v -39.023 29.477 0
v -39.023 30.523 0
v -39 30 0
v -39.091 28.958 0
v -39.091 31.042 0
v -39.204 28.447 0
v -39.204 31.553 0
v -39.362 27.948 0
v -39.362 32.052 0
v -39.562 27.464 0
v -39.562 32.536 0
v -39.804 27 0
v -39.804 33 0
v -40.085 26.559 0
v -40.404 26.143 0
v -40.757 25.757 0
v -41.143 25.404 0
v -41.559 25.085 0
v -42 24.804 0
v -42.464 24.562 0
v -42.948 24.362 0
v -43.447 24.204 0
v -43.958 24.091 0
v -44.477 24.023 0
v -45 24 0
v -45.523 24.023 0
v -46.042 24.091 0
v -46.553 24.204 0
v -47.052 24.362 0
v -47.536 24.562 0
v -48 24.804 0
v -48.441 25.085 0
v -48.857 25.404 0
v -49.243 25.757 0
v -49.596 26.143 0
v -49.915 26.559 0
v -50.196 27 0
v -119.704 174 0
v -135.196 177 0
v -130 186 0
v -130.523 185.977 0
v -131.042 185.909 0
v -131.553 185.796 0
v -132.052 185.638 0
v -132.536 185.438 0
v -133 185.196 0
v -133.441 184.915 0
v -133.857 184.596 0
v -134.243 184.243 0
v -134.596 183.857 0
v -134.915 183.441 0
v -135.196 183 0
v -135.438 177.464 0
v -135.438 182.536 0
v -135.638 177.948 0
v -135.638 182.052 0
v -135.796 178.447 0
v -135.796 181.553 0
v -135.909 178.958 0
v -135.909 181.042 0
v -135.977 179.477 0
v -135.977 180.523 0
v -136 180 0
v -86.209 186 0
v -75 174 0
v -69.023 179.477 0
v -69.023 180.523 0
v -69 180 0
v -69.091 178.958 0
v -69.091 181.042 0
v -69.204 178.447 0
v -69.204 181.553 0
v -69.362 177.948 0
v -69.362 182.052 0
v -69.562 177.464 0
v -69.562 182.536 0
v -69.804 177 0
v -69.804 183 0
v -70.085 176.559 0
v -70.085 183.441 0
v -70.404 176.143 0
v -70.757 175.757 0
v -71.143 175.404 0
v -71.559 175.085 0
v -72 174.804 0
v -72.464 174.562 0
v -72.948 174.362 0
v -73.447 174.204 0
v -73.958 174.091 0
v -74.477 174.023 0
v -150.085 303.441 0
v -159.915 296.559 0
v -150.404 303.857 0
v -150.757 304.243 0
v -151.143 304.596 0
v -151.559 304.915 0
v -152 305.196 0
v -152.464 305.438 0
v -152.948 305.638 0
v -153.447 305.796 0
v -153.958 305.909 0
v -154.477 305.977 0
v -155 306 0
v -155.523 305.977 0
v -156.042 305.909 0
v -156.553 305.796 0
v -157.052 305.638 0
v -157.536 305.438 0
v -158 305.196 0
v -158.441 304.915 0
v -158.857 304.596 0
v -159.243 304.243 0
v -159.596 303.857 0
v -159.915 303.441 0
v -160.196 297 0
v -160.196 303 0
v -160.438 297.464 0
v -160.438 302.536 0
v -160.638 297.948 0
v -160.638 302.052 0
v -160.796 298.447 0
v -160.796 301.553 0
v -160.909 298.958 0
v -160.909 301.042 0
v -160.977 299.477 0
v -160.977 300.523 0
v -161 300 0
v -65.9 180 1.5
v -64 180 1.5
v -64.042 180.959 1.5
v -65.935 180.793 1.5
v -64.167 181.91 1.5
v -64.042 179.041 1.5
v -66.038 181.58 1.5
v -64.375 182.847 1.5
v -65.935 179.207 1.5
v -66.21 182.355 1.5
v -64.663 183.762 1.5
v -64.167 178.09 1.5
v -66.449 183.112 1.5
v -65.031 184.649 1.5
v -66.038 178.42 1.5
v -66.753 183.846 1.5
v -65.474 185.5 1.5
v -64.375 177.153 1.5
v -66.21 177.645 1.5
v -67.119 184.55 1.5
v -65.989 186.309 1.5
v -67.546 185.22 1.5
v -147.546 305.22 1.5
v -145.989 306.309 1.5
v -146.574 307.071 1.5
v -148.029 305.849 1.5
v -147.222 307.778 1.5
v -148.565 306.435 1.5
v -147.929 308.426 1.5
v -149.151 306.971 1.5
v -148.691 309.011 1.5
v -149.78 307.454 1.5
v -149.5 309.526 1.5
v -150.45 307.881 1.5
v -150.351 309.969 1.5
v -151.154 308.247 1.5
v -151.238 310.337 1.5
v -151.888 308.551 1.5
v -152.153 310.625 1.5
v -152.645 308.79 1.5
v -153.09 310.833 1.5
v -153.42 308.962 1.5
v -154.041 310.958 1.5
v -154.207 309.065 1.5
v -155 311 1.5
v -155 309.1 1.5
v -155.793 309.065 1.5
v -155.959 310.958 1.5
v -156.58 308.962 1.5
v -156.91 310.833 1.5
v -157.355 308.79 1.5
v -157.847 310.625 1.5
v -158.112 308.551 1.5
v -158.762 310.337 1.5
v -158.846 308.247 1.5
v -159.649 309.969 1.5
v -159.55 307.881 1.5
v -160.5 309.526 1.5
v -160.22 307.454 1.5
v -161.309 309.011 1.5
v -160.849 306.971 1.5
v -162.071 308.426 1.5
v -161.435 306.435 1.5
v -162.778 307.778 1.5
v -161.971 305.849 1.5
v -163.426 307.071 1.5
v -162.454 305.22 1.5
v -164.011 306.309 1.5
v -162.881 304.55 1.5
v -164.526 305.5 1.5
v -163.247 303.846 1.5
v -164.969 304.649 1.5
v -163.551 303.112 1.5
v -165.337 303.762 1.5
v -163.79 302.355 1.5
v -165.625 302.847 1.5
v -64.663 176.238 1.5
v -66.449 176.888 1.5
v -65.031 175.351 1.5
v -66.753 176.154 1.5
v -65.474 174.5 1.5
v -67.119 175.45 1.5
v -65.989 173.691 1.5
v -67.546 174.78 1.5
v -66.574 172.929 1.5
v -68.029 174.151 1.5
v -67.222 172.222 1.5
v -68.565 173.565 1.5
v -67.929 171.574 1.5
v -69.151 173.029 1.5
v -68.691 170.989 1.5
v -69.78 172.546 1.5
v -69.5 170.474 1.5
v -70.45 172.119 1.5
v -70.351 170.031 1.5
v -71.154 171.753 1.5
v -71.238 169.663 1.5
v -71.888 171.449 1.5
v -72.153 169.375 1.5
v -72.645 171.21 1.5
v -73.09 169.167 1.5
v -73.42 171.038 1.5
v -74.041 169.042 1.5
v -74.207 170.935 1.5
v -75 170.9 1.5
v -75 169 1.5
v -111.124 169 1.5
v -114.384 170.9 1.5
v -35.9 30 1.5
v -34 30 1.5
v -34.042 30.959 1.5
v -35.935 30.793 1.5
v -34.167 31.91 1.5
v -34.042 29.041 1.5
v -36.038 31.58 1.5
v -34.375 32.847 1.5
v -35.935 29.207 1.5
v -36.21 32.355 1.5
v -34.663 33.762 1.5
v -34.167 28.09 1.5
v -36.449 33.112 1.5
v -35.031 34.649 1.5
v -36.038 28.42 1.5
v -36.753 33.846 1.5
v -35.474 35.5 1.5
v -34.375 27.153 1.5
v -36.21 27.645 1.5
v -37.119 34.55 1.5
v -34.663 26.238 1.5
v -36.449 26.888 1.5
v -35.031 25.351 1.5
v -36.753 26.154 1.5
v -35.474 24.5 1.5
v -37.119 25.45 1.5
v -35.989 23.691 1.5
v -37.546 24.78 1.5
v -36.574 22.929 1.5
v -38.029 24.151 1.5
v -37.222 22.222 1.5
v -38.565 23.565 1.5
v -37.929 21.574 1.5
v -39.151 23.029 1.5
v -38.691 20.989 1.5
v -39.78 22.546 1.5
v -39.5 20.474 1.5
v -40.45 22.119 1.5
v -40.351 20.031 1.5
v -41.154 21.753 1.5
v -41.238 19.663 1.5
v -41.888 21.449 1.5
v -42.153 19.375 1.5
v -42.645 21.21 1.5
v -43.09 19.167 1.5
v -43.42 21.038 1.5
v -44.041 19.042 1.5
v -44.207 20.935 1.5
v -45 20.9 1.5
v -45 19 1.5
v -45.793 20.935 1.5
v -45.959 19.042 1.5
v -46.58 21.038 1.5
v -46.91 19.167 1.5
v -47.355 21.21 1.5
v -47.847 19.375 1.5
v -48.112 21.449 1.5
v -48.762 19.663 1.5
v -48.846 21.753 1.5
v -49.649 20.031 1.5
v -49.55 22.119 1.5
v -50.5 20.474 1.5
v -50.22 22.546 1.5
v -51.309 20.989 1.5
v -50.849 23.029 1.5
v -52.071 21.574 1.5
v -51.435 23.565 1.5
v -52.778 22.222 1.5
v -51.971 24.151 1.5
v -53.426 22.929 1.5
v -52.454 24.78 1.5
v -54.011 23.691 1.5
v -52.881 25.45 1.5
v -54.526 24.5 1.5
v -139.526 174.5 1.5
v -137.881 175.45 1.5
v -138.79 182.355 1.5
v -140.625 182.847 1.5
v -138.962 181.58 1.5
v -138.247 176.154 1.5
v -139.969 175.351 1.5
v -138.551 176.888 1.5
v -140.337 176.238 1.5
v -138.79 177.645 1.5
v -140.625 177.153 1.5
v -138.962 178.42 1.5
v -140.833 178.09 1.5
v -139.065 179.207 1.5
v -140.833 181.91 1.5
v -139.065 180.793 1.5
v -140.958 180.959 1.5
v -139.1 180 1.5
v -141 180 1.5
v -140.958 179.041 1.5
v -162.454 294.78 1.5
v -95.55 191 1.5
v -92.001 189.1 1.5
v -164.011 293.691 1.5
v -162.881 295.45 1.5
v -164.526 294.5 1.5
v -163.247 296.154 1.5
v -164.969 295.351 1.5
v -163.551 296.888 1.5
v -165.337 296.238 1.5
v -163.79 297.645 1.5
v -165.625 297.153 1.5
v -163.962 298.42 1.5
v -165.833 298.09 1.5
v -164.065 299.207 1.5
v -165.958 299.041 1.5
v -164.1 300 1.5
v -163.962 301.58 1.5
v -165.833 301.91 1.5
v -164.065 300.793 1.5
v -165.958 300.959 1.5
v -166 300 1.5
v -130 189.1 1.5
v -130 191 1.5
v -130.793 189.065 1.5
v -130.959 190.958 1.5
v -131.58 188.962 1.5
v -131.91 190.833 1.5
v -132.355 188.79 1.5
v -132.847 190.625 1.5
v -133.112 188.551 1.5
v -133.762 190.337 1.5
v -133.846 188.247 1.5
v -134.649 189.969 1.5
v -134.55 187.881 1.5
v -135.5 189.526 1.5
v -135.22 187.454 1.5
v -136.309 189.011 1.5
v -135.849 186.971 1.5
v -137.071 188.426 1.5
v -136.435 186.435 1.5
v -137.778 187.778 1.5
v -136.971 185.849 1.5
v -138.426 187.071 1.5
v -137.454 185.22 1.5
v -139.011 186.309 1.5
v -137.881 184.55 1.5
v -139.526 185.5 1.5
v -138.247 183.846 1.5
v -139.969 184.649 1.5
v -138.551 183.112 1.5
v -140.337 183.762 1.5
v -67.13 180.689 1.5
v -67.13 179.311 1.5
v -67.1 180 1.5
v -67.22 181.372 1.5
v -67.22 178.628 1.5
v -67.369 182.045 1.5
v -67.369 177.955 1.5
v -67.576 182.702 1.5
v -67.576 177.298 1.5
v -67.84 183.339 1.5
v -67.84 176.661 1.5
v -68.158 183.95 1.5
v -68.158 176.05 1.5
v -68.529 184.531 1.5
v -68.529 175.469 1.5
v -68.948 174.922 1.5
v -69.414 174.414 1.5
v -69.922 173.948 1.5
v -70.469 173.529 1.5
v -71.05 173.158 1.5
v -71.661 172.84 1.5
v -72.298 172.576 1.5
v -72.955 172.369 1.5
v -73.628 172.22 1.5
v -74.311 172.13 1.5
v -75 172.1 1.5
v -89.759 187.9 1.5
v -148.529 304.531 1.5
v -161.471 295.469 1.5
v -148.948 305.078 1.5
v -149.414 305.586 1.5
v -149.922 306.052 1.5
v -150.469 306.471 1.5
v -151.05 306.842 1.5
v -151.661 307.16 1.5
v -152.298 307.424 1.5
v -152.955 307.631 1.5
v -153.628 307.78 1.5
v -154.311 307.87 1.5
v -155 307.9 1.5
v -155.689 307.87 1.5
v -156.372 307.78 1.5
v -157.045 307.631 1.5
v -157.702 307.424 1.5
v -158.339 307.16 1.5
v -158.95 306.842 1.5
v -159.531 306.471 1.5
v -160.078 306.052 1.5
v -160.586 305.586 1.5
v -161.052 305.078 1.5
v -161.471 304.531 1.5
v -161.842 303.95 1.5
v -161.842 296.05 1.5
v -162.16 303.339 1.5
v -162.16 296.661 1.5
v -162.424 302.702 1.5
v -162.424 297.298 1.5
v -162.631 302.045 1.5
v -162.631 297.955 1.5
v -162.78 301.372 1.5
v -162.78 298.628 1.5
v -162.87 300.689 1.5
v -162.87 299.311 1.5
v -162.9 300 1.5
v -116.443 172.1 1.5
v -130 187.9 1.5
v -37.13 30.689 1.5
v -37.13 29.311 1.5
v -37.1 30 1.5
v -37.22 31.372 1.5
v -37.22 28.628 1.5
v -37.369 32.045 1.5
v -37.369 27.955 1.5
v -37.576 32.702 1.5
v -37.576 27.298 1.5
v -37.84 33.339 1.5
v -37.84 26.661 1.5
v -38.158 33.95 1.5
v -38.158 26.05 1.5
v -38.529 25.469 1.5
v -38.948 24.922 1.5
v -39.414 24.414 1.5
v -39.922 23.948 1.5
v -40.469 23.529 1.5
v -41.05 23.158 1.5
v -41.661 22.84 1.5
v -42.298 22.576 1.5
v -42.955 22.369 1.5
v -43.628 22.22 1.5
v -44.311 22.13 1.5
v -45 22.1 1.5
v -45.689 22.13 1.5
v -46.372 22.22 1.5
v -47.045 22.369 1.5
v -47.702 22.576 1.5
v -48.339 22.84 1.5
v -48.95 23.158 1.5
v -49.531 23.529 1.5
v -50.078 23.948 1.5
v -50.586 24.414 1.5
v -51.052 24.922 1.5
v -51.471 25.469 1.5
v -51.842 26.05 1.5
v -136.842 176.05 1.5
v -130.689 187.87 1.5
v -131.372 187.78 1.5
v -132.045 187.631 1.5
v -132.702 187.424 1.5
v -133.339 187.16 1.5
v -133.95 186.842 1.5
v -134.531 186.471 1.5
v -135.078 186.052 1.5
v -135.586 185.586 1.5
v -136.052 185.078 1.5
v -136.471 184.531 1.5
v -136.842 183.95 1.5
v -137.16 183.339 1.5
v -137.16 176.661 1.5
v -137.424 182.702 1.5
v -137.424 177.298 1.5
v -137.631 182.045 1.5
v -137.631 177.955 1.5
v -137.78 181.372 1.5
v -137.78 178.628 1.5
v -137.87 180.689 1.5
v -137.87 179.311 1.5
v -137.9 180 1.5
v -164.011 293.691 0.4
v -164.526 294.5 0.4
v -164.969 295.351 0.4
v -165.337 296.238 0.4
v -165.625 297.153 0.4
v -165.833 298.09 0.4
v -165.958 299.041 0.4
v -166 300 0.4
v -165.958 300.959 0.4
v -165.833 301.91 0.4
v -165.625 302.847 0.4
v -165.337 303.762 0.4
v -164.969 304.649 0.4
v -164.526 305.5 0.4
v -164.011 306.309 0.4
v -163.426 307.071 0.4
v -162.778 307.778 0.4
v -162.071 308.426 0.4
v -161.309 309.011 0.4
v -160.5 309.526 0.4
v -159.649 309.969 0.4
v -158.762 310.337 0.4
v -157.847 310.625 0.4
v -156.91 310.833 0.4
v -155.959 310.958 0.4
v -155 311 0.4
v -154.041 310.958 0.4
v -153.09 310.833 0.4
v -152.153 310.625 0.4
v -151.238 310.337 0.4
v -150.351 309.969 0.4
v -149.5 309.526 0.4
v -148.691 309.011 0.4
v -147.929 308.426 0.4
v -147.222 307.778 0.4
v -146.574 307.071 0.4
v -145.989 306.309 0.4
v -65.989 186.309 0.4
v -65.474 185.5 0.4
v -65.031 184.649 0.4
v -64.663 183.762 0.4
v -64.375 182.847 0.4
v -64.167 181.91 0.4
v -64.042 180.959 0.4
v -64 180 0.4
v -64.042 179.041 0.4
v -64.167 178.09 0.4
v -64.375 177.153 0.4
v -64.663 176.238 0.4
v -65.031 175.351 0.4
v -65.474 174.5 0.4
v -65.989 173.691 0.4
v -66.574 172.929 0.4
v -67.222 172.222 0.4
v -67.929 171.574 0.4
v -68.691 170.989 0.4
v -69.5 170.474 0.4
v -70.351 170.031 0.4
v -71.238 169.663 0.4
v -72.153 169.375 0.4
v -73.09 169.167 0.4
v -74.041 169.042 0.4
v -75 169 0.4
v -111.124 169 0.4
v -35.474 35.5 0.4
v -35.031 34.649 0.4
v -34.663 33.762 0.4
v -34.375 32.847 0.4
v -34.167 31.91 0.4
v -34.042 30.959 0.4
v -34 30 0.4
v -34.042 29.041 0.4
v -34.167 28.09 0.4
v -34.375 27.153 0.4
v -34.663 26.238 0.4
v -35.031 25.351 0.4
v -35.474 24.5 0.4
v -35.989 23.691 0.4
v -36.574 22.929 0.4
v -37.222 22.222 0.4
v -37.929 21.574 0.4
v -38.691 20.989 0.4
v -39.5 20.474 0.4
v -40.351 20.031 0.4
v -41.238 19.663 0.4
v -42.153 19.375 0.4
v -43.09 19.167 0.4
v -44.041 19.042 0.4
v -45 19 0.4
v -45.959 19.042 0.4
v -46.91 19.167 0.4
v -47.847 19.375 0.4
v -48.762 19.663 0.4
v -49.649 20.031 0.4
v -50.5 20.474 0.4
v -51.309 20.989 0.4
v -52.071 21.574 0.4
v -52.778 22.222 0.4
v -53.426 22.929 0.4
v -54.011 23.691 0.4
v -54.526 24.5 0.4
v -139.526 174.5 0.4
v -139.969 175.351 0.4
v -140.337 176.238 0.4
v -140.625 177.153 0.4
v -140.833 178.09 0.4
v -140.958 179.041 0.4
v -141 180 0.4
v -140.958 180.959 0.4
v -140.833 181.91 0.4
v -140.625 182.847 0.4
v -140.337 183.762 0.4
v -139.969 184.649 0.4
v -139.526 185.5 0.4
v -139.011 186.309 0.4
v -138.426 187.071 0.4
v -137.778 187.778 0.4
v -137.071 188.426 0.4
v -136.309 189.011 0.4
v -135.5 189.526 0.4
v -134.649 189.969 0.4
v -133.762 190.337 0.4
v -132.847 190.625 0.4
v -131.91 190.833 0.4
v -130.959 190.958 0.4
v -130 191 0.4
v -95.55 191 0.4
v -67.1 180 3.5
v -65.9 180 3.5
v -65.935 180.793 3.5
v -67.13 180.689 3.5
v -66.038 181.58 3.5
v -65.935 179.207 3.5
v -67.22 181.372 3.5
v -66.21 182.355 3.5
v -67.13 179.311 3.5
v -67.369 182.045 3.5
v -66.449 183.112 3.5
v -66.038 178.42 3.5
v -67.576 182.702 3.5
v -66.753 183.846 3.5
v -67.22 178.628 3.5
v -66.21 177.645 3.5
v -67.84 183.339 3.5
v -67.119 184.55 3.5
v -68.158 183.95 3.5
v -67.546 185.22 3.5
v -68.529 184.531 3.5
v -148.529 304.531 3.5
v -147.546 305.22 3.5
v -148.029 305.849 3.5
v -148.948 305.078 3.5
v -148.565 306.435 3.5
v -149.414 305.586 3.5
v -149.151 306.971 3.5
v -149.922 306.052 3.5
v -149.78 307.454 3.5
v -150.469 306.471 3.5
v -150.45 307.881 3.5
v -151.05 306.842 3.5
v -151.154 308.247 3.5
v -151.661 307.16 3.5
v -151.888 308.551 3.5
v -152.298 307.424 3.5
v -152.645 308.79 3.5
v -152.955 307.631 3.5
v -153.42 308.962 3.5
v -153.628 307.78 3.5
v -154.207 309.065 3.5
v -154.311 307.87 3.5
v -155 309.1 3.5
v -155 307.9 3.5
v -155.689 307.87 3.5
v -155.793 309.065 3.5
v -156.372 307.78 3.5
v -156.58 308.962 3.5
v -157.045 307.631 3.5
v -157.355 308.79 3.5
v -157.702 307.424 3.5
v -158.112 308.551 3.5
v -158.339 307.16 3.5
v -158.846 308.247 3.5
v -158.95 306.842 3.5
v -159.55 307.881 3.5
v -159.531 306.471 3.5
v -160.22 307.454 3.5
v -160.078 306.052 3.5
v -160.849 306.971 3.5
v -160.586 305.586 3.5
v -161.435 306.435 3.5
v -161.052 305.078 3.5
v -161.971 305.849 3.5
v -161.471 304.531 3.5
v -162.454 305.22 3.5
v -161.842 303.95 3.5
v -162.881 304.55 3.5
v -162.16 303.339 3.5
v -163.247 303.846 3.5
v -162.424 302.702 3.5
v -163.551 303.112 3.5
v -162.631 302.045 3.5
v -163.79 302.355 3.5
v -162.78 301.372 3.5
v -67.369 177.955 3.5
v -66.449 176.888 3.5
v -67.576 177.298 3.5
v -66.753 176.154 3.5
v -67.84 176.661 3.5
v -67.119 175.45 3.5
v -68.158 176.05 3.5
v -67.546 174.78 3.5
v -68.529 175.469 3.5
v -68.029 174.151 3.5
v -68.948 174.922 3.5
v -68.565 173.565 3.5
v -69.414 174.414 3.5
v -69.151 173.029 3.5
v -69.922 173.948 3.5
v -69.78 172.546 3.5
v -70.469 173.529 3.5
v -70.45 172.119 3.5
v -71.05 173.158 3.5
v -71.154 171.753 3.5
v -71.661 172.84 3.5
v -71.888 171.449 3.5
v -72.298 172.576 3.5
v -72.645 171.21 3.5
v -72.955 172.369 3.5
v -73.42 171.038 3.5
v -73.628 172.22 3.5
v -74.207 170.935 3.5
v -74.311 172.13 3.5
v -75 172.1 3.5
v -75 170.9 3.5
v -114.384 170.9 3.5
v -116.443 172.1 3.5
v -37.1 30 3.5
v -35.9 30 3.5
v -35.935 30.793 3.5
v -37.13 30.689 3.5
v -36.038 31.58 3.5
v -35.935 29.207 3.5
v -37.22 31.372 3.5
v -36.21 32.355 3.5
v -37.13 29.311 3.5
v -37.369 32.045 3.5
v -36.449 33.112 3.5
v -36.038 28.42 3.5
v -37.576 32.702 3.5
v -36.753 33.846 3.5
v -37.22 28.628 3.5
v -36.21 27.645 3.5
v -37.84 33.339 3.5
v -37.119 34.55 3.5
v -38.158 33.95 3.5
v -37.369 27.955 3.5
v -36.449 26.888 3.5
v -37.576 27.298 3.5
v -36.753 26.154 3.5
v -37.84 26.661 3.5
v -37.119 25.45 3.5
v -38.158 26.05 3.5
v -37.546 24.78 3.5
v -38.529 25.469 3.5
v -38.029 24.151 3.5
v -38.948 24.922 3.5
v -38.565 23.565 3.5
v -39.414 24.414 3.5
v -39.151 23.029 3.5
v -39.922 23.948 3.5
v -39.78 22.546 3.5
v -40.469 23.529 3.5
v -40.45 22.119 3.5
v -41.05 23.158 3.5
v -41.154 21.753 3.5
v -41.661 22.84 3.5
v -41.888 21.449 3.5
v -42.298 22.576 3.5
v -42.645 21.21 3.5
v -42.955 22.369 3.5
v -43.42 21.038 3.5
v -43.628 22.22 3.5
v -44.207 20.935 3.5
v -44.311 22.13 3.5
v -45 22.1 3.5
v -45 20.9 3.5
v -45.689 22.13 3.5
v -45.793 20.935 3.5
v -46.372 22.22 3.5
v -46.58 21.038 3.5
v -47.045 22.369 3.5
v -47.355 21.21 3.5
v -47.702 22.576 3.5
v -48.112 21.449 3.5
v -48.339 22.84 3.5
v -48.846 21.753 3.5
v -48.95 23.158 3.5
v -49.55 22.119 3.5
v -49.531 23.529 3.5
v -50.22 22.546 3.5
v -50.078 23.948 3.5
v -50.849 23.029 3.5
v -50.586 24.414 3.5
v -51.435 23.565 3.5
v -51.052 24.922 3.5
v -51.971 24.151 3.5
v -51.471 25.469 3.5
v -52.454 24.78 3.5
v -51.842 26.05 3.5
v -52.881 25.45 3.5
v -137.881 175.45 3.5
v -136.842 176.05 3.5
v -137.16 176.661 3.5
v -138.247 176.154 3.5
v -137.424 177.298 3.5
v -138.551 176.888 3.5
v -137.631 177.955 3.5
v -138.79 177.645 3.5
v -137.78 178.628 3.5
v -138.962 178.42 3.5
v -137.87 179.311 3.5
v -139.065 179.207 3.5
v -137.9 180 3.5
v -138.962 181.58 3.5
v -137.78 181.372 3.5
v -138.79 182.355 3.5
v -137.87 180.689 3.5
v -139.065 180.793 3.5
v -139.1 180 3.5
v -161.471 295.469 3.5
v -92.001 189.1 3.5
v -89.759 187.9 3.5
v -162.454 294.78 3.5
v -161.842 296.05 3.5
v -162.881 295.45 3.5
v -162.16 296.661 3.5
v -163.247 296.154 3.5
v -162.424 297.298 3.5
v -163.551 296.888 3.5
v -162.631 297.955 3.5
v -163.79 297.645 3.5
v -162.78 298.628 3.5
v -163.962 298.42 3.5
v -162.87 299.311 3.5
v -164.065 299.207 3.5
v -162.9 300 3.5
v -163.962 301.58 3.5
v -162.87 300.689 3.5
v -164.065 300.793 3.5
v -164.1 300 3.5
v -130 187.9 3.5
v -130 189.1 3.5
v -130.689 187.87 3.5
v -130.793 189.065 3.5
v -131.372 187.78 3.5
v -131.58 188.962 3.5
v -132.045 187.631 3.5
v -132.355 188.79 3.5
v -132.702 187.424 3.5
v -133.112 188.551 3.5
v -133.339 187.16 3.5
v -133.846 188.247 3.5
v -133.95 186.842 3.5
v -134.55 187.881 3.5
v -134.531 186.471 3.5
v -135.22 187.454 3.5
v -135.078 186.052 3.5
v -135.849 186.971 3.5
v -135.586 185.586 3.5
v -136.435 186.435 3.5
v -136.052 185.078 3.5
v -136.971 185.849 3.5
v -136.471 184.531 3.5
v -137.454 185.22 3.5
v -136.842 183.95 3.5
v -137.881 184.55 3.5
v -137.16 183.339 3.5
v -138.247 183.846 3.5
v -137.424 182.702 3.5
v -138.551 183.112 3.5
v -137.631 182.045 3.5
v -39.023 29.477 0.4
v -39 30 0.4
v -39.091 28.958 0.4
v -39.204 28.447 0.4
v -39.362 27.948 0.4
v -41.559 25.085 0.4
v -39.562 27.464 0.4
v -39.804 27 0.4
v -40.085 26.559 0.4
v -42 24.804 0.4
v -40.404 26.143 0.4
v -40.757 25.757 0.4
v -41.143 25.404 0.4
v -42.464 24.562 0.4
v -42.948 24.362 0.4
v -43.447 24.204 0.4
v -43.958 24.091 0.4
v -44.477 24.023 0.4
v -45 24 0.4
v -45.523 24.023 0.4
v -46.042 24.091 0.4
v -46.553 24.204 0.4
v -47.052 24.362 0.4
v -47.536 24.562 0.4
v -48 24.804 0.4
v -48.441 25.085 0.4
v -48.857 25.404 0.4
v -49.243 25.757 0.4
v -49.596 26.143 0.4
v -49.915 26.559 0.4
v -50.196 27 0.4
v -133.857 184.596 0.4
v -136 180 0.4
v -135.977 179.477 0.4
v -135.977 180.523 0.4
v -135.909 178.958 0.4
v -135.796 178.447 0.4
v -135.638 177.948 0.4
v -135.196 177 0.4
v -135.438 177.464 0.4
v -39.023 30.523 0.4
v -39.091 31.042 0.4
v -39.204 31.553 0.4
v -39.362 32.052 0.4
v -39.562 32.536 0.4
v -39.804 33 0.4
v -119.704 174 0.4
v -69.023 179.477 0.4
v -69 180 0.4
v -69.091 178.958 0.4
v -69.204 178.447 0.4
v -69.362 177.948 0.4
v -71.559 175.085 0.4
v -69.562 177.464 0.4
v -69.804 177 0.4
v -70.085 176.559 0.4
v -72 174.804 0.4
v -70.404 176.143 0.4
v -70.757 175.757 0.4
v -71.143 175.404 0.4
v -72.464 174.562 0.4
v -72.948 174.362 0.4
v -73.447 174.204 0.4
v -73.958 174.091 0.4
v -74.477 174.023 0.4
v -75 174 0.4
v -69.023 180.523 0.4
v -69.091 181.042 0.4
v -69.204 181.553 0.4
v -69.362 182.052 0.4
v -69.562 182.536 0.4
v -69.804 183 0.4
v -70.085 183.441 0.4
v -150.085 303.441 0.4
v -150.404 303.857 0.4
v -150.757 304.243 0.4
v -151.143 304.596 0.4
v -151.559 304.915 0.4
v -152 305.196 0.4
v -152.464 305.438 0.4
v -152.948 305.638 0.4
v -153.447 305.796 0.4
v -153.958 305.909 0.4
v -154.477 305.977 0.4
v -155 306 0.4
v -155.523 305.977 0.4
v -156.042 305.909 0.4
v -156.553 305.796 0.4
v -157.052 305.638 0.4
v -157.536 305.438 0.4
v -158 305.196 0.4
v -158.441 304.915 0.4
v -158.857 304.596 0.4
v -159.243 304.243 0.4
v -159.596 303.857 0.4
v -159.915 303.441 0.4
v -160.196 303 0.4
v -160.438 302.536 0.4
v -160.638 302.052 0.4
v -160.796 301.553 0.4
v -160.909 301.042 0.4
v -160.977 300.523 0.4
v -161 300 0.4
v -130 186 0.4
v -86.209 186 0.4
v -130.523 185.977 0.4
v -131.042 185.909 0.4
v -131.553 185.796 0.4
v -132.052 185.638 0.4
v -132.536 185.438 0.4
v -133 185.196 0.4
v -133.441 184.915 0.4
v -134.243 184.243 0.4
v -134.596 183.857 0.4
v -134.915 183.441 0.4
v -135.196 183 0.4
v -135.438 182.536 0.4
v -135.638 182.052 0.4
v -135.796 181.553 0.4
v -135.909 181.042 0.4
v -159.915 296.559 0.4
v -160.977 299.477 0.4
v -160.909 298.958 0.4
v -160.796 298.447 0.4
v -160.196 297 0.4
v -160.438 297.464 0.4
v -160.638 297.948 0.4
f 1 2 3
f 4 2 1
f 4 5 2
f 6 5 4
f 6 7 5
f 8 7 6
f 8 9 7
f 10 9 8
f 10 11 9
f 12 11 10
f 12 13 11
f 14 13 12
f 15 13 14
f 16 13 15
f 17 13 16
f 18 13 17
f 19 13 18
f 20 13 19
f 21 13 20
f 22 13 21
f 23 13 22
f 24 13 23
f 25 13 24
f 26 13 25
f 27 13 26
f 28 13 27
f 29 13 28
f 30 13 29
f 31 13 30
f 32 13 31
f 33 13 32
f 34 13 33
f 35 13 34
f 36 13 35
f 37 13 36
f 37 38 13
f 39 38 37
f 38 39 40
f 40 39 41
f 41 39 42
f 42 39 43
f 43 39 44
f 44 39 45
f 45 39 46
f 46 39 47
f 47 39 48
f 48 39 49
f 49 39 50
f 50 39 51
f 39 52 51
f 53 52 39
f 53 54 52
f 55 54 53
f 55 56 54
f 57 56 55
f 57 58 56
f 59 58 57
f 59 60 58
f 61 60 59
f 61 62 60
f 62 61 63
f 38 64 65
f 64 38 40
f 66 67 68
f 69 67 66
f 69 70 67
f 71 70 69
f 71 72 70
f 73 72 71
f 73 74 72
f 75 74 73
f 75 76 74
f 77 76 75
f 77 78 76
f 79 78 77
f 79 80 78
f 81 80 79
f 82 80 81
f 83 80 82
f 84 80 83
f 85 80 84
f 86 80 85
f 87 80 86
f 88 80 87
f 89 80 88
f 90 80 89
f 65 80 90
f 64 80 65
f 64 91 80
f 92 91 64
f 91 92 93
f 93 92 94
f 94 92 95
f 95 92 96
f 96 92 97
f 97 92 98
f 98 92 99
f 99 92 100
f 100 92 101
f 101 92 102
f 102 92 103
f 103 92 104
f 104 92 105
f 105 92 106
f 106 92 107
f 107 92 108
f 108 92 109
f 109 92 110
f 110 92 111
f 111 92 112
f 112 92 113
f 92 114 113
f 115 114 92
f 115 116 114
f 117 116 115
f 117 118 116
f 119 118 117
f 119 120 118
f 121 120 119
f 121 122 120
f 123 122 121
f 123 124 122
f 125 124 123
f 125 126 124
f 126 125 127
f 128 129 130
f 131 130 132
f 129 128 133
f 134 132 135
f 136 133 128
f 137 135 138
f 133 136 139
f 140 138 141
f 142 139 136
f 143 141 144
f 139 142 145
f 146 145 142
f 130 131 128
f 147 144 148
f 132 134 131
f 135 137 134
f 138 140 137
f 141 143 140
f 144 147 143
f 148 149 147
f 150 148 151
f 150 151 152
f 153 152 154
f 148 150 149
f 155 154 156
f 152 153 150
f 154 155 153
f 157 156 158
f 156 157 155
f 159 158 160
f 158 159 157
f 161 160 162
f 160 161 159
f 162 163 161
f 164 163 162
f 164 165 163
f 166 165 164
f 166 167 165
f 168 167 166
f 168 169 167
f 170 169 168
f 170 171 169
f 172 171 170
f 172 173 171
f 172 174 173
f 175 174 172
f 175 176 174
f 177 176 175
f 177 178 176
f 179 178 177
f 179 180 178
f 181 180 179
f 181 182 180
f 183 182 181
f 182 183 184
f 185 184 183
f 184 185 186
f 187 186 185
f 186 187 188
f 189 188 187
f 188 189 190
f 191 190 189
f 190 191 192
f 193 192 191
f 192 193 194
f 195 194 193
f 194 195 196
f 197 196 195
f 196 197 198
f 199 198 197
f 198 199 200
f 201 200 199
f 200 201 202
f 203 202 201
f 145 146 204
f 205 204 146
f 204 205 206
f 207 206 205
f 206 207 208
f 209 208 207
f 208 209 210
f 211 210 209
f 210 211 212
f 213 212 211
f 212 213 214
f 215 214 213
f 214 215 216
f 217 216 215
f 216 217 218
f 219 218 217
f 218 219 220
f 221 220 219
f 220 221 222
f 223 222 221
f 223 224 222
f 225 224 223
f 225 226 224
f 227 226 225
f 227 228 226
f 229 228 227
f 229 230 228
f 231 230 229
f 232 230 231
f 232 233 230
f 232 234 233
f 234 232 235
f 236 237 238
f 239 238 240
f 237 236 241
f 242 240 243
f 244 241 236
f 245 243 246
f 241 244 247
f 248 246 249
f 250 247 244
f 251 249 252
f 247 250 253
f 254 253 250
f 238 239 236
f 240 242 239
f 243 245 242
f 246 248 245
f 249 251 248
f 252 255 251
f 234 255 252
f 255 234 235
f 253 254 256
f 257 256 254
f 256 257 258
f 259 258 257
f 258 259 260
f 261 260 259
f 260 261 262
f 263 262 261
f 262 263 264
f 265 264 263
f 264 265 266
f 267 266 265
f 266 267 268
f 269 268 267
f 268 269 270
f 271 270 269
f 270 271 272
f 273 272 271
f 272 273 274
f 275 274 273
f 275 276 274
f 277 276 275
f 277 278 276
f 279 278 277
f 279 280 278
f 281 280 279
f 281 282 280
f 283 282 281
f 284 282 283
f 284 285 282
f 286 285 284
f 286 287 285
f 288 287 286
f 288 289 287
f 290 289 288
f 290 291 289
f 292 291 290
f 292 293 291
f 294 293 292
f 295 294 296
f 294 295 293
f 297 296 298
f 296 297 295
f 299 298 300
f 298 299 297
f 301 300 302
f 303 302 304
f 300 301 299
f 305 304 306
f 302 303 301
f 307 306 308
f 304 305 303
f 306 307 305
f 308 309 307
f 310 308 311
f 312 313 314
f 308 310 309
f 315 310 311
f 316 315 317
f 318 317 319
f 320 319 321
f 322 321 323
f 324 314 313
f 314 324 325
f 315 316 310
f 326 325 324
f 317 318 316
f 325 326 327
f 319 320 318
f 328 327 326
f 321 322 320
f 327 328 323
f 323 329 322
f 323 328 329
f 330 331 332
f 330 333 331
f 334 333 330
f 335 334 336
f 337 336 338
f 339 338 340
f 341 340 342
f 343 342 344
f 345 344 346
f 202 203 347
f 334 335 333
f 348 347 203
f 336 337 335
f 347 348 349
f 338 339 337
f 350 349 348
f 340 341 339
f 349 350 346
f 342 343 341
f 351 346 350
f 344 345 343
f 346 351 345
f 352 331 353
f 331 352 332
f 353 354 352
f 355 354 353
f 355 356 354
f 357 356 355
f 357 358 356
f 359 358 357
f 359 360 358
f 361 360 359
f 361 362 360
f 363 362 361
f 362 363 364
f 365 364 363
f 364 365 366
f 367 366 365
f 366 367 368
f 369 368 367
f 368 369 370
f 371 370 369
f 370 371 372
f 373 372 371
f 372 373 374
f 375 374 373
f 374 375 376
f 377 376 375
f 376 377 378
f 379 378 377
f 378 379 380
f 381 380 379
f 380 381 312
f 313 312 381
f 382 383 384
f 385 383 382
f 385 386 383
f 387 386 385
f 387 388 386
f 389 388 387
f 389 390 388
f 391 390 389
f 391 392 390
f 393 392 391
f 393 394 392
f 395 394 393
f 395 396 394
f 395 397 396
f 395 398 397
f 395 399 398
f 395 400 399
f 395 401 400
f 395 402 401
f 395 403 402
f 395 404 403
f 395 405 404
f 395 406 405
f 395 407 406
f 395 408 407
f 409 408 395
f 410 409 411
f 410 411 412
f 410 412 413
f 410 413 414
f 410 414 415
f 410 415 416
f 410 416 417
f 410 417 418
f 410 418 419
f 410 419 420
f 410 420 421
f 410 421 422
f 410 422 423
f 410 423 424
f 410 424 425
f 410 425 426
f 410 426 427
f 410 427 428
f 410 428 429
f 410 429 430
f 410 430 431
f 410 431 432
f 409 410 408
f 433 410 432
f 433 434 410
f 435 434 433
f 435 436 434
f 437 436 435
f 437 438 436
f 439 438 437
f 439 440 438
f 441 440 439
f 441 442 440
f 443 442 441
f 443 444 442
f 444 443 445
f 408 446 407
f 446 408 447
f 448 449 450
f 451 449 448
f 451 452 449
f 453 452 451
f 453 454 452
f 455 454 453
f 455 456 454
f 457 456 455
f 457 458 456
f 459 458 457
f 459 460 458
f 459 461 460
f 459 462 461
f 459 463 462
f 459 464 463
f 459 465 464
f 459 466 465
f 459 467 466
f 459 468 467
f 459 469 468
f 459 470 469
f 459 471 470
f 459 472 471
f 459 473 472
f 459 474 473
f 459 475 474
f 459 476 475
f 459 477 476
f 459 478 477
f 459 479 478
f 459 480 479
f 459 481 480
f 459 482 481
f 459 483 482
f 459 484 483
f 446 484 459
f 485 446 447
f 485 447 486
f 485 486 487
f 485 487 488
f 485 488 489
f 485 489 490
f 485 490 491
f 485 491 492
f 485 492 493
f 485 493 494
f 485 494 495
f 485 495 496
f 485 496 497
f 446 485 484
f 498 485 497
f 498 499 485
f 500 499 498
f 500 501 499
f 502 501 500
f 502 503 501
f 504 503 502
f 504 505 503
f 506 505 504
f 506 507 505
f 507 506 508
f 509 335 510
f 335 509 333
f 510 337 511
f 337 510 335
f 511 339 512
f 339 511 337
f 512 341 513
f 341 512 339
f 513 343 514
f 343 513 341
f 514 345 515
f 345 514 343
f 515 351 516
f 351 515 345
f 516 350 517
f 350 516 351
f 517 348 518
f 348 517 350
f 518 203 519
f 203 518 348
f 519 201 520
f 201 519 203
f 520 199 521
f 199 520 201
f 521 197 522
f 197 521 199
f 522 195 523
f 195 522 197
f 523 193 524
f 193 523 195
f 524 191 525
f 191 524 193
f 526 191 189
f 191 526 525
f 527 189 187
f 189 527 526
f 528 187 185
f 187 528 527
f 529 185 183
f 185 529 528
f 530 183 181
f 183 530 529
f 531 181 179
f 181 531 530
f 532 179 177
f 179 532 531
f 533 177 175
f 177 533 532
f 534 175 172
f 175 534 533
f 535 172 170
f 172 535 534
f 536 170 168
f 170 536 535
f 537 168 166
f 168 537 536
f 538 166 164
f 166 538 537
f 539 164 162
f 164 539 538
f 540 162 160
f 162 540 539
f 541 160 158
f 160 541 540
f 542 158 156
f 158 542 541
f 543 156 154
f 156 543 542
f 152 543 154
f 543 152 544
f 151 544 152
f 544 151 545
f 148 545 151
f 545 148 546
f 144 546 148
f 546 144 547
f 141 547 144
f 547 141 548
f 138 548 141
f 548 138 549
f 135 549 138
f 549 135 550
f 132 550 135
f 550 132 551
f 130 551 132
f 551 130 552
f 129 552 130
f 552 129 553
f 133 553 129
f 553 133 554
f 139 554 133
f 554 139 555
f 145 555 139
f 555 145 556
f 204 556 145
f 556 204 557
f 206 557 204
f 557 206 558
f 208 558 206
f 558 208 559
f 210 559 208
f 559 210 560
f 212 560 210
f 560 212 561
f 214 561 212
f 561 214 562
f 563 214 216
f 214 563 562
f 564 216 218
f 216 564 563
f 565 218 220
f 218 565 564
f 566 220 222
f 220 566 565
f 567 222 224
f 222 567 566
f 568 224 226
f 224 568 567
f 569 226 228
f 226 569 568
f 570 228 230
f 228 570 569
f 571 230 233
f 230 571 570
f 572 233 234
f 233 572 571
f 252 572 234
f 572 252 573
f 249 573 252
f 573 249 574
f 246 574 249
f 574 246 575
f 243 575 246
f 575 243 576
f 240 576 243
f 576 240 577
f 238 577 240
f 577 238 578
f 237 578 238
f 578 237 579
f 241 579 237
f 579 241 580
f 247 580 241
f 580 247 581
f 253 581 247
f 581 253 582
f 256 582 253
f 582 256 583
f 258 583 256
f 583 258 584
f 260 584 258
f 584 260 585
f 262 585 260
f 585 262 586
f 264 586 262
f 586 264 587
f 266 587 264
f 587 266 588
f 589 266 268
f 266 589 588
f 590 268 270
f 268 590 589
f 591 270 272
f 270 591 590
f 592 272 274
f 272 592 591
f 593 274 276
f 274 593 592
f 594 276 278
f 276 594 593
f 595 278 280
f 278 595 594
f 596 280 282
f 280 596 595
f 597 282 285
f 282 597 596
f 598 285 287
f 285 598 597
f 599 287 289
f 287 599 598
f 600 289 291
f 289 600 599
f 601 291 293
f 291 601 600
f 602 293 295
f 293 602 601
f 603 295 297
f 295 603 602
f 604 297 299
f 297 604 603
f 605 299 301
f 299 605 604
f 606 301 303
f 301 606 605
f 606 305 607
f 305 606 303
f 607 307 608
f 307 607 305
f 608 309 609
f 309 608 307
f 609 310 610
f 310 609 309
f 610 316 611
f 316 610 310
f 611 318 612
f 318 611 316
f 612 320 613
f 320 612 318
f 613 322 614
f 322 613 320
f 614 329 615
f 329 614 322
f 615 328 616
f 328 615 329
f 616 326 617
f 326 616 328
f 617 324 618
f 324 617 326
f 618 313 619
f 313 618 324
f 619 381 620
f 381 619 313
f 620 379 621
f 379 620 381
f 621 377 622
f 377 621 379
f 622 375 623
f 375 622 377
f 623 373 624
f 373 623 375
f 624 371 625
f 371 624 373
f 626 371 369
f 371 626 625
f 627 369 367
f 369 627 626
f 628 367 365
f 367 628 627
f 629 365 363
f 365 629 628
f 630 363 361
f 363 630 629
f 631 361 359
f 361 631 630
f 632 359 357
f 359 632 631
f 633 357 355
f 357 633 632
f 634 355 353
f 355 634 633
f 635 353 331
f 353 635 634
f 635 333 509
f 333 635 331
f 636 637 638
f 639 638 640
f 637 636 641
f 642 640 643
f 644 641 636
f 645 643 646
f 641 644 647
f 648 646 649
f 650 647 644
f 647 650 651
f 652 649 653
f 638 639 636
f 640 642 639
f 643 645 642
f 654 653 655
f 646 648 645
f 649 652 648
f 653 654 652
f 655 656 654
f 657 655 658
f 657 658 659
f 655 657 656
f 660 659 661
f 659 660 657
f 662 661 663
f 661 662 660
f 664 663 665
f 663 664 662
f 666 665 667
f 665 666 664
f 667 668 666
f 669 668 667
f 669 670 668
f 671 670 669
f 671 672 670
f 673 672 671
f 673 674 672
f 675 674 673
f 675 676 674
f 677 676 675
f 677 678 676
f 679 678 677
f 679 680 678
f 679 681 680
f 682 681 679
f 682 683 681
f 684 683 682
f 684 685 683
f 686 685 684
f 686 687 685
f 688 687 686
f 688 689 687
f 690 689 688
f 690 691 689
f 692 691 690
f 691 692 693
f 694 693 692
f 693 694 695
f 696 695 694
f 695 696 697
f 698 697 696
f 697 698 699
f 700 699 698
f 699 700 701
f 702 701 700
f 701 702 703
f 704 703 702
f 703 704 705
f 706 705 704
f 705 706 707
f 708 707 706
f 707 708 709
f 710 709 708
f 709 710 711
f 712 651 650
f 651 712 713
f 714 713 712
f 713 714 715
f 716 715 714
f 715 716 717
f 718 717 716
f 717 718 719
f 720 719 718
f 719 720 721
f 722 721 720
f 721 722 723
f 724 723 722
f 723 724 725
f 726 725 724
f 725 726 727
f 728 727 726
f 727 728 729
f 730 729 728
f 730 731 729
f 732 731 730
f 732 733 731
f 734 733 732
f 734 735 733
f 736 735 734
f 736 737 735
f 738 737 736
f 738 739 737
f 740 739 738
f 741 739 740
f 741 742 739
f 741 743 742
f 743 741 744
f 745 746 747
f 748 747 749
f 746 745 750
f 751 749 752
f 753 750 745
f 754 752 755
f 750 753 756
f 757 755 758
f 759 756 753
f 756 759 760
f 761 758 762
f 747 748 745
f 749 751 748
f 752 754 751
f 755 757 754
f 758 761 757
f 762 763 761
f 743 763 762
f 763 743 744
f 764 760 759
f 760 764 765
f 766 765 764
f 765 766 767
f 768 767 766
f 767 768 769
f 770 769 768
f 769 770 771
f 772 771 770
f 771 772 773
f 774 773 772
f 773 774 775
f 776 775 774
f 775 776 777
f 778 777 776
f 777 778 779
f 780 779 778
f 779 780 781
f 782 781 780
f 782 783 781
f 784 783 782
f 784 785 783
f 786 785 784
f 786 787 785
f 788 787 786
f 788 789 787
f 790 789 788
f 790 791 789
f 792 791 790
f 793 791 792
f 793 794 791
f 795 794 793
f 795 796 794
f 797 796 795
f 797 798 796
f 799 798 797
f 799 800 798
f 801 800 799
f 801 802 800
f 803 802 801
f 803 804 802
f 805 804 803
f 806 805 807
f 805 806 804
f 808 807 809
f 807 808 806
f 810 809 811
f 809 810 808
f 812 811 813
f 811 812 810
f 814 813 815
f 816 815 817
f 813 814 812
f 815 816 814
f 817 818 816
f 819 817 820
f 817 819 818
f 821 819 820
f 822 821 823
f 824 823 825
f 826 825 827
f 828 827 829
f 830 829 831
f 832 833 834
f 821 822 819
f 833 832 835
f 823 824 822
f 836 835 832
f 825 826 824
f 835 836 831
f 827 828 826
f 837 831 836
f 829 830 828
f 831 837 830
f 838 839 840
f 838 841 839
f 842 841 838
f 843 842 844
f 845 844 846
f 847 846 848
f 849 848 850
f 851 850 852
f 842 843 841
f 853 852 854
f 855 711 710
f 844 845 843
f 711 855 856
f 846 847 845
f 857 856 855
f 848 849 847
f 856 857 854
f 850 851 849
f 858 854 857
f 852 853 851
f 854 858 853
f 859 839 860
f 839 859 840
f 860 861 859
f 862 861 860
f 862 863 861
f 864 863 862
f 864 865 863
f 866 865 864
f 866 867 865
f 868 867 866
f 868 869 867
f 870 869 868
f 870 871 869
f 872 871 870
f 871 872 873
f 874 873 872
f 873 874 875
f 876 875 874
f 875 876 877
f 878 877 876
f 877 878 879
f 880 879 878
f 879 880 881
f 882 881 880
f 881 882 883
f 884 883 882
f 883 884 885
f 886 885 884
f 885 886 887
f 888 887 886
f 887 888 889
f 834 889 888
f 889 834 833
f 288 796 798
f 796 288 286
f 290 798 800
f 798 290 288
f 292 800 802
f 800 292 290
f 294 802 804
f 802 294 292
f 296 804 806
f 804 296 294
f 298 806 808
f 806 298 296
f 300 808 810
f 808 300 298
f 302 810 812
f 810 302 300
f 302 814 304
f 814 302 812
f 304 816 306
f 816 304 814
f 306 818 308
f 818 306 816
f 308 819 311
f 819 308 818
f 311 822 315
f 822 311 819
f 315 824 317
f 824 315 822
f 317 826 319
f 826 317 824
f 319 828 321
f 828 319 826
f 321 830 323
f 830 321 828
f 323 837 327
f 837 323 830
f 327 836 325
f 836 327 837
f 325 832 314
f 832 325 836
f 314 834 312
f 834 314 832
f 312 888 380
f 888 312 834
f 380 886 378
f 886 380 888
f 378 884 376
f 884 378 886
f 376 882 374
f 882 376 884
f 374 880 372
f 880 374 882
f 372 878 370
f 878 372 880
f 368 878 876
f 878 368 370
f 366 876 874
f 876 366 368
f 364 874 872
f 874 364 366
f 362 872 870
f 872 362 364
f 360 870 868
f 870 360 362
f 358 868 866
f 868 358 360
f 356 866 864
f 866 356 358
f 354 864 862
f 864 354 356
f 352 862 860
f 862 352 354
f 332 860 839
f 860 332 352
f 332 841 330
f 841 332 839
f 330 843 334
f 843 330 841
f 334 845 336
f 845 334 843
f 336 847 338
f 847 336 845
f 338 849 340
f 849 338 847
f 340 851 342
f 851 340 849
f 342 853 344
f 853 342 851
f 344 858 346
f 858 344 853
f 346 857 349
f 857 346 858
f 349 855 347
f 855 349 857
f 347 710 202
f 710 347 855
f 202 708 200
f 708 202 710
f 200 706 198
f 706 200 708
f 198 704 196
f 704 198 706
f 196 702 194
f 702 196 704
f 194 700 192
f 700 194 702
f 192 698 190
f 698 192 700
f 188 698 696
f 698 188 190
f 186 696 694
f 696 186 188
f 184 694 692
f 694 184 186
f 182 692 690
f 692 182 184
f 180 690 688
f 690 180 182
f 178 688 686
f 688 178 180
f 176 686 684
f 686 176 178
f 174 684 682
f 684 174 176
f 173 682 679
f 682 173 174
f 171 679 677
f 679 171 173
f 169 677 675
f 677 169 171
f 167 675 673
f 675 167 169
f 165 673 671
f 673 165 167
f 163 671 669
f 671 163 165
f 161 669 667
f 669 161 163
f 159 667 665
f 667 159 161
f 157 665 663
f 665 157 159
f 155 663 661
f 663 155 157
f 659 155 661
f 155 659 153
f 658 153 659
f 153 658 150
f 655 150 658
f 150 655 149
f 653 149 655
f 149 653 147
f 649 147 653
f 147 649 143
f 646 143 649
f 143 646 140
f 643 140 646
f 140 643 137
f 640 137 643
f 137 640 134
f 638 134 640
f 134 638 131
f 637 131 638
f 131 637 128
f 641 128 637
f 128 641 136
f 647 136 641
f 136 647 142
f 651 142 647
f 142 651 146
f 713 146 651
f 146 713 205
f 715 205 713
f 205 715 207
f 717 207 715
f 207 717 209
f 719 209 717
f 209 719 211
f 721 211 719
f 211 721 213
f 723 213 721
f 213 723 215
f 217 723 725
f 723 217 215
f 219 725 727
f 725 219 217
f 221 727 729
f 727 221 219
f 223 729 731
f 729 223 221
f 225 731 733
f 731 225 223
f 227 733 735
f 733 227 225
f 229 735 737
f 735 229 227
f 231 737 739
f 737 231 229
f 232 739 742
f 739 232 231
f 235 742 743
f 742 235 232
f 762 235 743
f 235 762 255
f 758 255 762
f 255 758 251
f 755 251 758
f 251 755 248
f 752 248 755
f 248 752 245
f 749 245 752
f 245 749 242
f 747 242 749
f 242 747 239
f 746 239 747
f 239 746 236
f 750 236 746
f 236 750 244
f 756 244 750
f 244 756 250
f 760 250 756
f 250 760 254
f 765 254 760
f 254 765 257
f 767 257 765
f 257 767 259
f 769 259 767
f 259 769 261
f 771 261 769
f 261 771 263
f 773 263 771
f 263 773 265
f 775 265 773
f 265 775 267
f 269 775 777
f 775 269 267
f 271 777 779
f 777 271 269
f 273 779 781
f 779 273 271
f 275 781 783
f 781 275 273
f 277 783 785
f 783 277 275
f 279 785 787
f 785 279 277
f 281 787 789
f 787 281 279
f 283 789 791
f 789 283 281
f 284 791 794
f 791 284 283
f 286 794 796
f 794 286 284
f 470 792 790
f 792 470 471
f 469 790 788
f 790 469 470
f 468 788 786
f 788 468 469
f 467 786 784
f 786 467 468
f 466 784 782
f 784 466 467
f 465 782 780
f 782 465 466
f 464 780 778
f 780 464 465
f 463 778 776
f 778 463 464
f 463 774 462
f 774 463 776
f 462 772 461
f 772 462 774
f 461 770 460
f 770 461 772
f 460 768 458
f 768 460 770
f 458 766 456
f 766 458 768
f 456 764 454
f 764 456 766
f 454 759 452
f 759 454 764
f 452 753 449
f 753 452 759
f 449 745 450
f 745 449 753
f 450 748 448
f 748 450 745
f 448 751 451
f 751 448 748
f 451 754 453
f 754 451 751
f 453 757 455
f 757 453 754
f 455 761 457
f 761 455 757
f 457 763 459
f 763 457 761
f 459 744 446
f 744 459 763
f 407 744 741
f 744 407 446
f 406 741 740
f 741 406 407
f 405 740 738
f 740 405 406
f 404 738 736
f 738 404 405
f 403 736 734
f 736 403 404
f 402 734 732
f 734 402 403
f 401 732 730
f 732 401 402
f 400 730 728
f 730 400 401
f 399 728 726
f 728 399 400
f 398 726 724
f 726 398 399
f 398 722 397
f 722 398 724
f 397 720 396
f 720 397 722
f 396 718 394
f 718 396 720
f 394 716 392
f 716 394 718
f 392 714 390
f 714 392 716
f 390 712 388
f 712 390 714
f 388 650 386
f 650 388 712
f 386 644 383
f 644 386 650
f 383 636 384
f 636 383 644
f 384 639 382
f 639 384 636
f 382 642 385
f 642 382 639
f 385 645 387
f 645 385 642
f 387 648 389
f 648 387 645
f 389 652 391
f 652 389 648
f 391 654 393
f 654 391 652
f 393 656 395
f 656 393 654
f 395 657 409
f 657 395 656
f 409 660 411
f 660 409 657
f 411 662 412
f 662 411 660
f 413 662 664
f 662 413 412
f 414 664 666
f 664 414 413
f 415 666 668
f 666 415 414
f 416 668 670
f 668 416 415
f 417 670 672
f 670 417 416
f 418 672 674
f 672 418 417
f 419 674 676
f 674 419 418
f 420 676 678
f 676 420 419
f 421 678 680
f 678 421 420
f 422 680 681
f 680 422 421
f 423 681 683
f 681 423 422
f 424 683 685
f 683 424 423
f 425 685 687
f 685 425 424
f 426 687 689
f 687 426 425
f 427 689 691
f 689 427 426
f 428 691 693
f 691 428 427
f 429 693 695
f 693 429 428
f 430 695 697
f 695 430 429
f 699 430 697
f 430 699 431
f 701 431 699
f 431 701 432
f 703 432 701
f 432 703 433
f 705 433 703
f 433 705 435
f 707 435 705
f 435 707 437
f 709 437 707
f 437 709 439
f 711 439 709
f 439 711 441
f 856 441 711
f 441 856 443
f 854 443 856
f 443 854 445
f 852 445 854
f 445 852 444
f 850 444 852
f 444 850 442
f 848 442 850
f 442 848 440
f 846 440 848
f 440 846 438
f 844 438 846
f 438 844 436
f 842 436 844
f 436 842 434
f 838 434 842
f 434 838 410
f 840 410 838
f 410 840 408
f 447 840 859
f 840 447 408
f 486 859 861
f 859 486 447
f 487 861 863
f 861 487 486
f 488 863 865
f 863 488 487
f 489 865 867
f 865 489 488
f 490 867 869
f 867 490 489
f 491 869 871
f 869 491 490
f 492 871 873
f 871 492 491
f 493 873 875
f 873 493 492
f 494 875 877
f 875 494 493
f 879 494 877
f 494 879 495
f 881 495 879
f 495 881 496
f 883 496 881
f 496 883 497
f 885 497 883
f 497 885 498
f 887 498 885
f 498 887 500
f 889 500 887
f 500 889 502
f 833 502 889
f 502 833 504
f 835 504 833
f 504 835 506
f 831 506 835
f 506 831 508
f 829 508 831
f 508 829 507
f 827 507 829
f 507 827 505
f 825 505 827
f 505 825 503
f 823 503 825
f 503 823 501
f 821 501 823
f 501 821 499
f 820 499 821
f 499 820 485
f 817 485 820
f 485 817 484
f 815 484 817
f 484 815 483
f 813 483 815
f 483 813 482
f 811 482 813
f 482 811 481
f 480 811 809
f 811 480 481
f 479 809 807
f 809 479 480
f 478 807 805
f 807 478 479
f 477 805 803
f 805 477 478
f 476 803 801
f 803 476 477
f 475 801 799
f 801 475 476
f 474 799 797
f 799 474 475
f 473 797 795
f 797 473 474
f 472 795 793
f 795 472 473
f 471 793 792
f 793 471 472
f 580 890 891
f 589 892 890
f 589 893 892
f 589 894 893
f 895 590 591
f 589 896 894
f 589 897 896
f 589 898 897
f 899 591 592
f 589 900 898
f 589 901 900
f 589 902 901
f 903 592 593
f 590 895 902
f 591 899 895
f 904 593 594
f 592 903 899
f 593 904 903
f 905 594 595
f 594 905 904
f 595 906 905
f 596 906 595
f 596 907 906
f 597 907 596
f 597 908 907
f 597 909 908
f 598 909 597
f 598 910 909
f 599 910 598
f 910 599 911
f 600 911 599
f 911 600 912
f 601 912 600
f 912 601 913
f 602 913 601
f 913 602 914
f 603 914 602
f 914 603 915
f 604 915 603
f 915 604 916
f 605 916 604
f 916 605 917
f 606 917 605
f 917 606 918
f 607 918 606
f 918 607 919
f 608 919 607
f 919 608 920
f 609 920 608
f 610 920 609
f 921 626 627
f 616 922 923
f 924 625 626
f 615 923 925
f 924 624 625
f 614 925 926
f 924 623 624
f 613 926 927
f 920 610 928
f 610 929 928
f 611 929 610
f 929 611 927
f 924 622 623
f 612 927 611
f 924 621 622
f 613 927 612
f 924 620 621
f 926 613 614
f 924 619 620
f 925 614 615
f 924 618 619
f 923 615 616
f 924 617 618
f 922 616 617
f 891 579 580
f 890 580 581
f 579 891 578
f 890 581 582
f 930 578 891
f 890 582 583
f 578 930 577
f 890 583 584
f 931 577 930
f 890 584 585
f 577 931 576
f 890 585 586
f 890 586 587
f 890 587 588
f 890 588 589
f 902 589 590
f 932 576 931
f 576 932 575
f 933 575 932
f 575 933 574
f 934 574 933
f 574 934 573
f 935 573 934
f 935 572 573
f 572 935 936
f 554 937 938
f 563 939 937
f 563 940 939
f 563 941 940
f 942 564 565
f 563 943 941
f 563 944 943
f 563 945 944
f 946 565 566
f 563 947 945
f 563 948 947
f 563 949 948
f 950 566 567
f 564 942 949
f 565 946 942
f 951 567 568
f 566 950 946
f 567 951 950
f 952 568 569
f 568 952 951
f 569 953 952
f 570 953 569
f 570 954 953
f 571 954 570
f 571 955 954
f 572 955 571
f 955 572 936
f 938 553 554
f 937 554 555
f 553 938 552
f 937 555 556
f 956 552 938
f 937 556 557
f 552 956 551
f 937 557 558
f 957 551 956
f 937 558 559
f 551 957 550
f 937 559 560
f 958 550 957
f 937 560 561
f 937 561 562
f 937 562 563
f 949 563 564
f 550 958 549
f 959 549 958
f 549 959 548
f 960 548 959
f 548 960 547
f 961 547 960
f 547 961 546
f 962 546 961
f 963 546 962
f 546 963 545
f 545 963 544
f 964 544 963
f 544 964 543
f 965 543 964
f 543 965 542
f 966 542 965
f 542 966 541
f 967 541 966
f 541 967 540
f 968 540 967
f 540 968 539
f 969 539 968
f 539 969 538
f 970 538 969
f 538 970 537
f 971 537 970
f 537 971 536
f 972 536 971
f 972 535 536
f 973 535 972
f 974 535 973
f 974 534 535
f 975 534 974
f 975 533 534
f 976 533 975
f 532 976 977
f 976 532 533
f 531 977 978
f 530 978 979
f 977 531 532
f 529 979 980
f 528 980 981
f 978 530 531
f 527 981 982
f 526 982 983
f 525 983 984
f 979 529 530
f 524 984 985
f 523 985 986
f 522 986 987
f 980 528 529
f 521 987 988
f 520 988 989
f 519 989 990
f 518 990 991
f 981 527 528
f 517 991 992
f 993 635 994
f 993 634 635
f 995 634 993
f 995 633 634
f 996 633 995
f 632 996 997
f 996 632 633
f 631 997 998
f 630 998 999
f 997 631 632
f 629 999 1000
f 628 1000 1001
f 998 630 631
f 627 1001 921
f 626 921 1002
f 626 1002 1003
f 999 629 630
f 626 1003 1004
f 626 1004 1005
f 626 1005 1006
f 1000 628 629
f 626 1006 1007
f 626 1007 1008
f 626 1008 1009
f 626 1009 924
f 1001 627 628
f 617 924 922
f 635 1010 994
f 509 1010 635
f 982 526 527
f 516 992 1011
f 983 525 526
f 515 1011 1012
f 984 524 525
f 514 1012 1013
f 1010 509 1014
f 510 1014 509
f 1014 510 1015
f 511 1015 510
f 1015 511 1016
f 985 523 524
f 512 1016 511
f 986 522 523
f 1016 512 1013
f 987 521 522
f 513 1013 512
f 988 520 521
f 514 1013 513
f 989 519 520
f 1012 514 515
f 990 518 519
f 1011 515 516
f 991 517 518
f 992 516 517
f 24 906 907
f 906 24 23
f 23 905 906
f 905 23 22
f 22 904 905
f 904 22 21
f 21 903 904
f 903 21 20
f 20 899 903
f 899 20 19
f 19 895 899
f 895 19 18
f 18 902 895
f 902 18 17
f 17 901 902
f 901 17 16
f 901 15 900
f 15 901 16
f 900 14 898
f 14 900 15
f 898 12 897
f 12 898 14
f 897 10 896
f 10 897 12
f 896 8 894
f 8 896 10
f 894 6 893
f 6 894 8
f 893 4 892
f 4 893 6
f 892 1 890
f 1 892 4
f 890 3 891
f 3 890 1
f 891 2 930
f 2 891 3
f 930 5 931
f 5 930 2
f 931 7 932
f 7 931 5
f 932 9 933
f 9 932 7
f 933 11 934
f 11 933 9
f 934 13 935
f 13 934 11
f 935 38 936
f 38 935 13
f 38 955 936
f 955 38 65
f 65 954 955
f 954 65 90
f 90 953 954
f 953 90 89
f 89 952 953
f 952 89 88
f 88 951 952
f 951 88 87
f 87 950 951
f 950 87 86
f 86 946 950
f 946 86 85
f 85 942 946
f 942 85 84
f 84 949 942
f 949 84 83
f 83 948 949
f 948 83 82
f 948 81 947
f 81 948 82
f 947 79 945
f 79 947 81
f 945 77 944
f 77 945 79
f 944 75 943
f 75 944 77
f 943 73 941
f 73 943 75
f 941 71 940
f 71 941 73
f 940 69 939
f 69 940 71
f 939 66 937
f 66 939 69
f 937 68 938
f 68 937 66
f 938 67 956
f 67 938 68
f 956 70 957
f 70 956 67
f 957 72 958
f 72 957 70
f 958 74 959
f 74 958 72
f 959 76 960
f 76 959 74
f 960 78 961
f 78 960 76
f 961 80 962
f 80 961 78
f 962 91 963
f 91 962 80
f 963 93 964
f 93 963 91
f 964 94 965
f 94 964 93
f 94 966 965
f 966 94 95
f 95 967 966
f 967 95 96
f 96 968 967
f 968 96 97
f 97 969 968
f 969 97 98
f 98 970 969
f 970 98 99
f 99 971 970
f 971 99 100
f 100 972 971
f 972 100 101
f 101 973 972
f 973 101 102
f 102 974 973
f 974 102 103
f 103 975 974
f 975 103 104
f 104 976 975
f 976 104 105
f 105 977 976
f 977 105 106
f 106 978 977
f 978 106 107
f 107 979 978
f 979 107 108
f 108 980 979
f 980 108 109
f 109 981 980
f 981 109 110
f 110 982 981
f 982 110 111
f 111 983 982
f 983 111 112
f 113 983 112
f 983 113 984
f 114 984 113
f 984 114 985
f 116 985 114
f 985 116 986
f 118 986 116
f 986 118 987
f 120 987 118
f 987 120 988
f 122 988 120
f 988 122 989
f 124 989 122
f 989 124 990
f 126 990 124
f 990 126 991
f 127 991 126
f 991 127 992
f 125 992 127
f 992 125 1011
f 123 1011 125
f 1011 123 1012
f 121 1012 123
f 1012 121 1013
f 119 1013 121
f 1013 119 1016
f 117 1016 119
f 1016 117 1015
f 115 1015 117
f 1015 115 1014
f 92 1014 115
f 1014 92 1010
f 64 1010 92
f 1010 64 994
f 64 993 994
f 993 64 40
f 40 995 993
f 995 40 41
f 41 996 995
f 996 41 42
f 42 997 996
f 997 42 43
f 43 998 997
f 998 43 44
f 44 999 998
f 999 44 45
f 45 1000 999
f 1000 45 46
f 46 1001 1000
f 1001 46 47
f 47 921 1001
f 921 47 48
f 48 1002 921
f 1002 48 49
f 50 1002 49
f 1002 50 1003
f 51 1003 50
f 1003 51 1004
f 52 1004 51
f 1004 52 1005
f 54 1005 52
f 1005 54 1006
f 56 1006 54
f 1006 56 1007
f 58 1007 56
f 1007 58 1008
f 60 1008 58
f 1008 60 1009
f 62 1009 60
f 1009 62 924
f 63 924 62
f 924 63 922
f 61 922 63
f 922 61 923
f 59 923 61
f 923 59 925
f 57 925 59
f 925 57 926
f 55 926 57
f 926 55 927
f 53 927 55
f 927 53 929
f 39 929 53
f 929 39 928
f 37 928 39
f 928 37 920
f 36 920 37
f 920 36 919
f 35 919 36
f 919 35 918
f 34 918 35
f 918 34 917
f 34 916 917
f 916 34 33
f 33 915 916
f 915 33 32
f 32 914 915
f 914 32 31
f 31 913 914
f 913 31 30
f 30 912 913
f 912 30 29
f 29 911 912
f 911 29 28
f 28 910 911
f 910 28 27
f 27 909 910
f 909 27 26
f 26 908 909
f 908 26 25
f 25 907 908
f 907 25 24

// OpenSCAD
// file: ../collar.scad
// Calibrated press-fit collar, merged into the rear wall at each pixel.
// The STL is symmetric top/bottom (retention lip at mid-height), so insertion
// direction does not matter. Native STL sits X-centered at collar_cx, Z 0..collar_h.

module collar_solid() {
    translate([-collar_cx, 0, 0])
        import(collar_stl, convexity = 6);
}

module place_collar(x, y) {
    translate([x, y, 0]) collar_solid();
}
// file: ../config.scad
// ===== CHARGE LED sign — global config =====
// Edit this file; then run ./build.sh to regenerate every STL.

$fn = 72;

// ---- bullet pixel datasheet (measured + validated) ----
// dome Ø8, barrel Ø12, flange Ø13.6 x 2mm, dome-tip -> flange 5.5mm.
// Above the plate: ~Ø12 barrel for ~0.5mm, then the Ø8 dome to a tip ~dome_clear
// above the plate front. Drives pixel_through, dome_clear, and led_void clearances.

// ---- calibrated collar (press-fit for 12mm bullet pixel) ----
collar_stl    = "../../assets/bullet-collar.stl"; // path resolved from src/parts/ entry files
collar_h      = 2.0;     // Z span of the collar STL
collar_od     = 16.0;    // collar outer diameter
collar_cx     = 43.0;    // STL native X center (Y center is 0)
pixel_through = 12.3;    // clearance hole through the plate (just over bore Ø12.19)
dome_clear    = 4.0;     // dome protrusion above plate front. Spec: 5.5mm dome-tip-to-flange,
                         // flange seats on plate back, minus 2mm plate ~= 3.5-4mm. Seat a real
                         // pixel and measure to lock it in.

// ---- shell ----
plate_t    = 2.0;        // rear plate thickness (== collar_h, so the collar sits flush)
wall_t     = 2.5;        // chimney wall thickness
cell_inner = 30;         // square interior of each test cell (the press-fit opening)

// ---- diffuser panels (flat, drop-in — kept for the final glued option) ----
panel_press_clear = 0.25; // panel is this much SMALLER than the opening (total) -> friction fit
panel_thicks      = [1, 2, 3];

// ---- diffuser CAP (slides over an ISOLATED chimney; not used on touching rows) ----
cap_fit_clear = 0.4;   // skirt-inner minus chimney-outer (total); bigger = looser slide
cap_skirt_t   = 1.6;   // skirt wall thickness
cap_skirt_h   = 7;     // how far the skirt grips down over the chimney

// ---- diffuser LID = flanged plug (plug locates in the opening, flange catches on the rim) ----
lid_flange_cover = wall_t;  // flange overhang per side ~= wall width (rests on rim, can't fall in)
lid_flange_gap   = 0.3;     // shrink the flange a hair so neighbour lids don't clash
lid_plug_h       = 4;       // how far the plug drops into the opening (0 = plain flat tile)
lid_plug_clear   = 0.2;     // plug-outer = opening minus this (total) -> friction fit
                            // (was 0.5/loose; PETG plug in a PLA hole grips well at 0.2)
lid_plug_wall    = 1.5;     // plug-frame wall thickness

// ---- coupon depth ladder ----
led_gaps = [10, 15, 20]; // clear LED-tip -> diffuser distance, per cell (mm)
                         // (was [20,35,50] — 35/50 went too dim/washed; 20 is the new max)

// ---- collar v2: original bore + lip, plus a 45-deg lead-in chamfer ----
bore_face_r   = 6.10;    // collar bore radius at each face (~Ø12.2)
chamfer_depth = 0.5;     // axial depth of the 45-deg lead-in at each face
mouth_r       = bore_face_r + chamfer_depth;  // chamfer mouth radius (~Ø13.2)

// ---- collar A/B test harness ----
harness_w     = 52;      // tile width
harness_d     = 30;      // tile depth
harness_t     = plate_t; // match the real wall thickness for a faithful fit test
harness_pitch = 24;      // spacing between the two hole centers

// ---- derived ----
cell_pitch = cell_inner + 2 * wall_t;      // outer cell footprint (35)
n_cells    = len(led_gaps);
plate_w    = n_cells * cell_pitch;
plate_d    = cell_pitch;
panel_side = cell_inner - panel_press_clear;
function cell_x(i)     = i * cell_pitch + cell_pitch / 2;   // column center (distance)
function cell_y(j)     = j * cell_pitch + cell_pitch / 2;   // row center (for grid coupons)
function chimney_H(i)  = plate_t + dome_clear + led_gaps[i];
// main file
// V2 CLEAR part: clear center stripe + body + lip (edges removed). filament 2.
include <../config.scad>
include <../collar.scad>
include <../bolt.scad>
bolt_lens_v2_clear();
